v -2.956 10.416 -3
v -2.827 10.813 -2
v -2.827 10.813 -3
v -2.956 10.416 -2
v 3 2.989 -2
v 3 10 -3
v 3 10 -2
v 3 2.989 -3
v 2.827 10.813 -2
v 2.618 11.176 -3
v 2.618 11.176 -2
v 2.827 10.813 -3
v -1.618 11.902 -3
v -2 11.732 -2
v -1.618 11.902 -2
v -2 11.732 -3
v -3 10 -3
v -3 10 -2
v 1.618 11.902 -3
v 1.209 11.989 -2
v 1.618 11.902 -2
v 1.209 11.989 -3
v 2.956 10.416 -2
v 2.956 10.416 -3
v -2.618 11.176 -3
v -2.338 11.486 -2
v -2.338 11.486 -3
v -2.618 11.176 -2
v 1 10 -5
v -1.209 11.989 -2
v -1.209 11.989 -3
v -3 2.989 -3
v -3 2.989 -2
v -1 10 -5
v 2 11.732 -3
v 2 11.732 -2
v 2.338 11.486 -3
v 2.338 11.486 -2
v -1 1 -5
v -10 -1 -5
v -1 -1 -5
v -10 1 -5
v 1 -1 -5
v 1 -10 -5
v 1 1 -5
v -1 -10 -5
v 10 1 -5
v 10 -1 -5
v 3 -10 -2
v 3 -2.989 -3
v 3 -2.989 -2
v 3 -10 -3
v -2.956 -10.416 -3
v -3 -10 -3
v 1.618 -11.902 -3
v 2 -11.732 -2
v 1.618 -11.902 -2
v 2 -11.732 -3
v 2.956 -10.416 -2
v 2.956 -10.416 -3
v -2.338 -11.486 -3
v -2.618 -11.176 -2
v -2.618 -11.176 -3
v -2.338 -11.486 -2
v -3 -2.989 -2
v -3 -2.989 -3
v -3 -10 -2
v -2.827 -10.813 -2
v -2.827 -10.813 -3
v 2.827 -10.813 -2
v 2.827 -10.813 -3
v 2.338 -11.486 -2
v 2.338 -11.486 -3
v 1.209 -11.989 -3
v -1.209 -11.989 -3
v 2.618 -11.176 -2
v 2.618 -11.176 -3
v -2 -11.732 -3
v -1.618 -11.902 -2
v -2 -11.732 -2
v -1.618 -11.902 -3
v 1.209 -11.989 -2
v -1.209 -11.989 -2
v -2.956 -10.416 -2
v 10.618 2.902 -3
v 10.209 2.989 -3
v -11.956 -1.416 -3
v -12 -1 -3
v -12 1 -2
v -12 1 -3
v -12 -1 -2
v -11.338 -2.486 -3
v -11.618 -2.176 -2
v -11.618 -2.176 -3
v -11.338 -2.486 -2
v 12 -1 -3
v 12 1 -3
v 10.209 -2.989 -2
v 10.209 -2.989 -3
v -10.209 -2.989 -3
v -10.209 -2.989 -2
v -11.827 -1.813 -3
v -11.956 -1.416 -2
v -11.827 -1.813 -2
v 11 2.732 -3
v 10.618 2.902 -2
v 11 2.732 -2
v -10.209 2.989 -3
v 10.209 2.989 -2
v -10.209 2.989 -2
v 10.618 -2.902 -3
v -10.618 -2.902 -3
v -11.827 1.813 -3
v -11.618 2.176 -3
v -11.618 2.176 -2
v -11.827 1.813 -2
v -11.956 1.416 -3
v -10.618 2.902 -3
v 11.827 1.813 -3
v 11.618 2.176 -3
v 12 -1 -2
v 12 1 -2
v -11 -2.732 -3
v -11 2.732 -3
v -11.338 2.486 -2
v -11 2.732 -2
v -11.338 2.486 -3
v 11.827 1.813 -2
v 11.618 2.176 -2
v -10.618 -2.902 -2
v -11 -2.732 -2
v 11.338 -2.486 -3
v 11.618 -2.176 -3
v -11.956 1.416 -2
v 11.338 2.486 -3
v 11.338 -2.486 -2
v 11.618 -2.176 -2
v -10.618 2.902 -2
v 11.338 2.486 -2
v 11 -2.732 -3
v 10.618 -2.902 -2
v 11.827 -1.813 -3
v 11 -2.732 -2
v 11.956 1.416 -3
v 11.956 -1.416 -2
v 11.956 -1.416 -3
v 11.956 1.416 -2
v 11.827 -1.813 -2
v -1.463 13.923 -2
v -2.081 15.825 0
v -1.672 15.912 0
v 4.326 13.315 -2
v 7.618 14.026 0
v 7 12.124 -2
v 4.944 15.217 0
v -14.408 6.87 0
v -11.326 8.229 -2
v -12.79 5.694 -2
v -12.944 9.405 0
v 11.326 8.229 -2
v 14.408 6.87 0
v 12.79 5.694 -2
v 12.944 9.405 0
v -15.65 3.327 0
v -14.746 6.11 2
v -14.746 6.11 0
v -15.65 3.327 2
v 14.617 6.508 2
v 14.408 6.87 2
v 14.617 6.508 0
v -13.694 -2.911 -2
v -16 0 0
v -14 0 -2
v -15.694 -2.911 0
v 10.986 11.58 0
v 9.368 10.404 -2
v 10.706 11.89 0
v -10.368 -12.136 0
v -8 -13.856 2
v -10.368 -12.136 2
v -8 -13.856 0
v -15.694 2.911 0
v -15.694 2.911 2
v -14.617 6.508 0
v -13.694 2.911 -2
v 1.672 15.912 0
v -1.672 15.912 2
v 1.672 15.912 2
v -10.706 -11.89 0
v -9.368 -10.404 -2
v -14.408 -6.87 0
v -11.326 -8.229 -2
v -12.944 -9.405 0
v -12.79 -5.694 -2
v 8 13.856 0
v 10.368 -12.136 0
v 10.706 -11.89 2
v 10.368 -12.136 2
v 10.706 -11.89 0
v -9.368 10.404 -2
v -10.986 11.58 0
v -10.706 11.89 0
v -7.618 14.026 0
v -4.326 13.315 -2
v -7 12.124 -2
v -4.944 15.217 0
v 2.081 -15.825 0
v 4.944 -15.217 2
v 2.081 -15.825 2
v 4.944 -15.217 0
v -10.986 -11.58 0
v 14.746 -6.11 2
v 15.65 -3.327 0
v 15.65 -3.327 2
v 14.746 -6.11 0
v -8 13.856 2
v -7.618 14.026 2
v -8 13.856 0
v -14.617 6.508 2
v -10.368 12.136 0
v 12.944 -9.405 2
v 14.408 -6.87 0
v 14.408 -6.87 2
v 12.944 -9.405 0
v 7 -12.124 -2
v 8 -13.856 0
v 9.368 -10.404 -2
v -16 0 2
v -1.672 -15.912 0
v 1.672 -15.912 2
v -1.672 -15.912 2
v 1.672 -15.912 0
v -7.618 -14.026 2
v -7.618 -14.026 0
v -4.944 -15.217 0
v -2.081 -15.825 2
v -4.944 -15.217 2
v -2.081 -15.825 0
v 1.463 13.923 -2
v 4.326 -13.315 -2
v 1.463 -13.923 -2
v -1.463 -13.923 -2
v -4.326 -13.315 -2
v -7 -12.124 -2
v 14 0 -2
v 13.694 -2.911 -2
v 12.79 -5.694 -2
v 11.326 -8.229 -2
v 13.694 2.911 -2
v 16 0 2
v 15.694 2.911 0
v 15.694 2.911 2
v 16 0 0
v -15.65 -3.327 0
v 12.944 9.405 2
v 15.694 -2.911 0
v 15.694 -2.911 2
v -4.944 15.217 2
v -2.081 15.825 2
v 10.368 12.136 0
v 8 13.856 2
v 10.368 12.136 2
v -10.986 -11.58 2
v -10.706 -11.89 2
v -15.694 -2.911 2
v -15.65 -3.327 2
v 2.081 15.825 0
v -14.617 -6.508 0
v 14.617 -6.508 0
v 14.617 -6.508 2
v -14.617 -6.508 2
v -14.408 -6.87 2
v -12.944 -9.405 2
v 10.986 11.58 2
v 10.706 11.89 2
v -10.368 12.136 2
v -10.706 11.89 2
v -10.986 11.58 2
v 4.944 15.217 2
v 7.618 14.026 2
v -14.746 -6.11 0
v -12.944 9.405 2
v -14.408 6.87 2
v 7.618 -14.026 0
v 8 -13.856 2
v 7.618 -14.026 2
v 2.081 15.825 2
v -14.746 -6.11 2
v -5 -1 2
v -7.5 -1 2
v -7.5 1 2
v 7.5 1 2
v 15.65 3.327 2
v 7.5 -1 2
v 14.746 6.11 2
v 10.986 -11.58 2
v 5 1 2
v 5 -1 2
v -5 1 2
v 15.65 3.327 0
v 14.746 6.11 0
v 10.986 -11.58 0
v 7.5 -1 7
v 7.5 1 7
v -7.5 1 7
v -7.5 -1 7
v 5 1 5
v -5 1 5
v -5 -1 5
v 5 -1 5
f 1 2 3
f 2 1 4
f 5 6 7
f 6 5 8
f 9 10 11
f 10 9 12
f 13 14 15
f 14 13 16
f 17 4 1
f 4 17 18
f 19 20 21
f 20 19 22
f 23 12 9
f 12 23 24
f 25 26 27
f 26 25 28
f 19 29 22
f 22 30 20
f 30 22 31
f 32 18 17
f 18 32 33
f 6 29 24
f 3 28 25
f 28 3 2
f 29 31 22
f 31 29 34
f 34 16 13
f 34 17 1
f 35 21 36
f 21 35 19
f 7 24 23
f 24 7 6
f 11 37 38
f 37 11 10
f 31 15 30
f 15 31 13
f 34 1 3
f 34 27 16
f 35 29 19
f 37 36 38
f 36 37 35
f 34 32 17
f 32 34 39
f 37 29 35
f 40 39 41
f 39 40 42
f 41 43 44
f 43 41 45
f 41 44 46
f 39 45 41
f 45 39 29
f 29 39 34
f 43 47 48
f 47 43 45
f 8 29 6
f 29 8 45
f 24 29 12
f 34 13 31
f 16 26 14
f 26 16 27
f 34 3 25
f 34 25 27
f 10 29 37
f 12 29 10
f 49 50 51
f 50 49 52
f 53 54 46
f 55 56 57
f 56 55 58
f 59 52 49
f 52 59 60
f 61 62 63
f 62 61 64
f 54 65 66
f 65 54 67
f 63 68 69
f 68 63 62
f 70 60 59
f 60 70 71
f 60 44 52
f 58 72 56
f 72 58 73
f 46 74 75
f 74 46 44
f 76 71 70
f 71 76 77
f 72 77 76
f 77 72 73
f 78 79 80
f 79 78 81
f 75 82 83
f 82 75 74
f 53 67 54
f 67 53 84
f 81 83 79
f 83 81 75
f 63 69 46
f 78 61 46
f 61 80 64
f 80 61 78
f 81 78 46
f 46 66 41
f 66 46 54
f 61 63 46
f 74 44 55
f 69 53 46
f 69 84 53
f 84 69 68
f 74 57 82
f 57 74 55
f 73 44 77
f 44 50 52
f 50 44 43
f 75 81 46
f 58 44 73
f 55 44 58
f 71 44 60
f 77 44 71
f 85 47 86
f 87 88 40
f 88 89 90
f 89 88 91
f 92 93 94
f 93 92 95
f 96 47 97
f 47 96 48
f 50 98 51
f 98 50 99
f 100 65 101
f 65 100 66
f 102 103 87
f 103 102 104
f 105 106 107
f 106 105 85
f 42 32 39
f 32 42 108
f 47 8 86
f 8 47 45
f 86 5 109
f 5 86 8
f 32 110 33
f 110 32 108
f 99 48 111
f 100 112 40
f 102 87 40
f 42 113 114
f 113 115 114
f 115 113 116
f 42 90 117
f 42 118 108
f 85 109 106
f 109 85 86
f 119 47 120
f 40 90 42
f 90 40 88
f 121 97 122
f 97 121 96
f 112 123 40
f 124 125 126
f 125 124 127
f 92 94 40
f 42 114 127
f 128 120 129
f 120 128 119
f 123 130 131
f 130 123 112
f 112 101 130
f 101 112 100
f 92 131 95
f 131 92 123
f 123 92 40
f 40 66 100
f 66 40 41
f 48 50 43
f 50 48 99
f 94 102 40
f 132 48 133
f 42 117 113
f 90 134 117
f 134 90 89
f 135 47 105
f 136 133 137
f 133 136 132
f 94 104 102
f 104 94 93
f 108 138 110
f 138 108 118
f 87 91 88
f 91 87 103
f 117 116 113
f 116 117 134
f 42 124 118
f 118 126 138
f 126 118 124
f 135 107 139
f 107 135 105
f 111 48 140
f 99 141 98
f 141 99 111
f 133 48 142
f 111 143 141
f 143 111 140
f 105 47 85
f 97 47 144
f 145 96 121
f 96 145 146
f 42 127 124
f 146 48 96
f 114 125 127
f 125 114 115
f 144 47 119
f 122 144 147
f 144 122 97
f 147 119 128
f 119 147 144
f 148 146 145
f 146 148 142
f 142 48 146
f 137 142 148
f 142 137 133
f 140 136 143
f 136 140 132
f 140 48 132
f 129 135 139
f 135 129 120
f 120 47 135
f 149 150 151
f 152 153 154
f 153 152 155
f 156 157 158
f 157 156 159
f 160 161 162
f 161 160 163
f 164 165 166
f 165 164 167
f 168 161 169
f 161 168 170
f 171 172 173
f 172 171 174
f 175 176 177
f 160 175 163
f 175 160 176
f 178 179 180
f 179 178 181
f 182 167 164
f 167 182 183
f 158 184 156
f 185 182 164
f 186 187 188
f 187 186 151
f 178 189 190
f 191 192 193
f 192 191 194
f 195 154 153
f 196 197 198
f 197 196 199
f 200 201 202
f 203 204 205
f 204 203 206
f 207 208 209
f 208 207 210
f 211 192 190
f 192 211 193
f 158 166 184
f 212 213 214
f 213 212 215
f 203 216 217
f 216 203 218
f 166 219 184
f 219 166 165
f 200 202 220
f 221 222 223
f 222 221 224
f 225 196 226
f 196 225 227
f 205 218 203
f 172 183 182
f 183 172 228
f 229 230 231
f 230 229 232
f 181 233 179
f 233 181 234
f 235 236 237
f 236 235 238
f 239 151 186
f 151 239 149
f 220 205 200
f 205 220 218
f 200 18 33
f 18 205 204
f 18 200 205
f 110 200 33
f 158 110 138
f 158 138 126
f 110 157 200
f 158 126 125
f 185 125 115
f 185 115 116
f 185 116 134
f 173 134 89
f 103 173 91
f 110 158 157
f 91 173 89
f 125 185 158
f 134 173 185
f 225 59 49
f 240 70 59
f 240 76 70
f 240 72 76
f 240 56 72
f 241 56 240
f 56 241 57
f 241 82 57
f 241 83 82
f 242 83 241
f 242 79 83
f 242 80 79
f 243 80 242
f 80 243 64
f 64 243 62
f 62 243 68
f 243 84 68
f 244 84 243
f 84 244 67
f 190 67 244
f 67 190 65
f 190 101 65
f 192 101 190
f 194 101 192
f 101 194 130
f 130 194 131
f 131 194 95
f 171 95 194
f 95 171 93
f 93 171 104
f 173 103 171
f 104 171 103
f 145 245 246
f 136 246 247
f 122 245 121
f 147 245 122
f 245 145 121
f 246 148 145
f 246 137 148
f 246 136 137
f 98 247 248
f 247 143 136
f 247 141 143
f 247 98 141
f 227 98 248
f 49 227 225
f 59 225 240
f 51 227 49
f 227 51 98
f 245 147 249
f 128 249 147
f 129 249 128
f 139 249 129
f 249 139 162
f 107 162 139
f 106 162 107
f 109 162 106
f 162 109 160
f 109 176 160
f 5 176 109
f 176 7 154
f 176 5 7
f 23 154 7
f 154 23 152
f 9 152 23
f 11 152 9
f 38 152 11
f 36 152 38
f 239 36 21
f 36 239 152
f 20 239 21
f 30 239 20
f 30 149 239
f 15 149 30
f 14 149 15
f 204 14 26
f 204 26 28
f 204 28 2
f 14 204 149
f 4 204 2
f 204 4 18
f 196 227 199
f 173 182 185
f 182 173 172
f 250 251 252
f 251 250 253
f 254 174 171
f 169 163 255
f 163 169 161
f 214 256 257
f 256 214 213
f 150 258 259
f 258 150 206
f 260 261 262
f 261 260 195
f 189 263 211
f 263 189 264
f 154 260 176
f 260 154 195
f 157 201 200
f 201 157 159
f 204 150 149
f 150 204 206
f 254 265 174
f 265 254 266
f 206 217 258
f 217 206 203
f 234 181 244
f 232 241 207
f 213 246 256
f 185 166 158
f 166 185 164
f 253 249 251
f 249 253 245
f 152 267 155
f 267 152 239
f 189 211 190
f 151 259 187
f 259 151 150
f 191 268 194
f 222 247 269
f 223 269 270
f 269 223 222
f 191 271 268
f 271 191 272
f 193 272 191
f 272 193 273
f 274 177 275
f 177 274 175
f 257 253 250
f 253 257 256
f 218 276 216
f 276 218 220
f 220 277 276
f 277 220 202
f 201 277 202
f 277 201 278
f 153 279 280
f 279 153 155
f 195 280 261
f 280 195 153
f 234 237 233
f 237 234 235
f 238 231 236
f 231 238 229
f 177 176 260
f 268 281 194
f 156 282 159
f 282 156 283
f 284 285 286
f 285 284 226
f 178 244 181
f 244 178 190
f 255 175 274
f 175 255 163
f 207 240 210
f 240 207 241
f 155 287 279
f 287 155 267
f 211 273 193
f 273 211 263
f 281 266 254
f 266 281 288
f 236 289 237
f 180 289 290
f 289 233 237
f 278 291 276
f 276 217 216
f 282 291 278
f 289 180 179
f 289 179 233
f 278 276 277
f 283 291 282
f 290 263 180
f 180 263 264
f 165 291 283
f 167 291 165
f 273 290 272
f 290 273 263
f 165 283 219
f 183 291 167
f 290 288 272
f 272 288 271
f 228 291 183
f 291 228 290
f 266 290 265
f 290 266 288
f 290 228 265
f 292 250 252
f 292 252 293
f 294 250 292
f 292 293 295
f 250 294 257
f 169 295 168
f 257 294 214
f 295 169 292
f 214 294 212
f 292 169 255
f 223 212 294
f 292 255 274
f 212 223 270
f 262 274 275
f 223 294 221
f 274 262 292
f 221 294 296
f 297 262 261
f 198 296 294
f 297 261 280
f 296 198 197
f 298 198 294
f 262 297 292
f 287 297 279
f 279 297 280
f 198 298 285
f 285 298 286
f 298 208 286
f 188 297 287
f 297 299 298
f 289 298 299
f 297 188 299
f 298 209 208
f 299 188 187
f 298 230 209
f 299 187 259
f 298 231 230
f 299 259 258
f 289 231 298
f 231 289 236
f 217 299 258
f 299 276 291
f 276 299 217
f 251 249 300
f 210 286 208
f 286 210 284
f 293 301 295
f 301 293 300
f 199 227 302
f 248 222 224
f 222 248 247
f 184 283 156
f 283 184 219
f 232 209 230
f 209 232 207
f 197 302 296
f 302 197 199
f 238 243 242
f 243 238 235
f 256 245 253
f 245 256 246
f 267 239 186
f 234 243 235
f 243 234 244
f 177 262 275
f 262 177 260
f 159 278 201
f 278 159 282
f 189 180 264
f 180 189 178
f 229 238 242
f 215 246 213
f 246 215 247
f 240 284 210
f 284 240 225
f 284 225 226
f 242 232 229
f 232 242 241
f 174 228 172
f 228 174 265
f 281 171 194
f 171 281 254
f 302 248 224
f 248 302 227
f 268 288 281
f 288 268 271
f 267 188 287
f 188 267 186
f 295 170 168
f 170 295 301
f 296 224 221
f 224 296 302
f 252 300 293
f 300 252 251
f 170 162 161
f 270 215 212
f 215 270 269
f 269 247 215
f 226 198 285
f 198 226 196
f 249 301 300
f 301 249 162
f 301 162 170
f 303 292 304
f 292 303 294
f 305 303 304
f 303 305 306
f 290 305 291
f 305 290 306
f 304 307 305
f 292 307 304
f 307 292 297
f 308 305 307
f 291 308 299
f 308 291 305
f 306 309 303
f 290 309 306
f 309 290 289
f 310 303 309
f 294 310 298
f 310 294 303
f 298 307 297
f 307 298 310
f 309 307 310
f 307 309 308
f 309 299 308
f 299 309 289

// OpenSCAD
// Author: https://github.com/gringer
// Origin: https://github.com/openscad/openscad/issues/356#issuecomment-29764897

$fn=30;

translate([0,0,-2]) minkowski(){
    union(){
        cylinder(r=10+4, h = 2); // base
        translate([0,0,-2]){ // image
            cube([2,20,2], center = true);
            cube([20,2,2], center = true);
        }
    }
    cylinder(r1 = 0, r2 = 2, h = 2);  // bevel
}

translate([0,0,4]){ // handle
    difference() {
        cube([15,2,6], center = true);
        translate([0,0,-1]) cube([10,3,4], center = true);
    }
}
